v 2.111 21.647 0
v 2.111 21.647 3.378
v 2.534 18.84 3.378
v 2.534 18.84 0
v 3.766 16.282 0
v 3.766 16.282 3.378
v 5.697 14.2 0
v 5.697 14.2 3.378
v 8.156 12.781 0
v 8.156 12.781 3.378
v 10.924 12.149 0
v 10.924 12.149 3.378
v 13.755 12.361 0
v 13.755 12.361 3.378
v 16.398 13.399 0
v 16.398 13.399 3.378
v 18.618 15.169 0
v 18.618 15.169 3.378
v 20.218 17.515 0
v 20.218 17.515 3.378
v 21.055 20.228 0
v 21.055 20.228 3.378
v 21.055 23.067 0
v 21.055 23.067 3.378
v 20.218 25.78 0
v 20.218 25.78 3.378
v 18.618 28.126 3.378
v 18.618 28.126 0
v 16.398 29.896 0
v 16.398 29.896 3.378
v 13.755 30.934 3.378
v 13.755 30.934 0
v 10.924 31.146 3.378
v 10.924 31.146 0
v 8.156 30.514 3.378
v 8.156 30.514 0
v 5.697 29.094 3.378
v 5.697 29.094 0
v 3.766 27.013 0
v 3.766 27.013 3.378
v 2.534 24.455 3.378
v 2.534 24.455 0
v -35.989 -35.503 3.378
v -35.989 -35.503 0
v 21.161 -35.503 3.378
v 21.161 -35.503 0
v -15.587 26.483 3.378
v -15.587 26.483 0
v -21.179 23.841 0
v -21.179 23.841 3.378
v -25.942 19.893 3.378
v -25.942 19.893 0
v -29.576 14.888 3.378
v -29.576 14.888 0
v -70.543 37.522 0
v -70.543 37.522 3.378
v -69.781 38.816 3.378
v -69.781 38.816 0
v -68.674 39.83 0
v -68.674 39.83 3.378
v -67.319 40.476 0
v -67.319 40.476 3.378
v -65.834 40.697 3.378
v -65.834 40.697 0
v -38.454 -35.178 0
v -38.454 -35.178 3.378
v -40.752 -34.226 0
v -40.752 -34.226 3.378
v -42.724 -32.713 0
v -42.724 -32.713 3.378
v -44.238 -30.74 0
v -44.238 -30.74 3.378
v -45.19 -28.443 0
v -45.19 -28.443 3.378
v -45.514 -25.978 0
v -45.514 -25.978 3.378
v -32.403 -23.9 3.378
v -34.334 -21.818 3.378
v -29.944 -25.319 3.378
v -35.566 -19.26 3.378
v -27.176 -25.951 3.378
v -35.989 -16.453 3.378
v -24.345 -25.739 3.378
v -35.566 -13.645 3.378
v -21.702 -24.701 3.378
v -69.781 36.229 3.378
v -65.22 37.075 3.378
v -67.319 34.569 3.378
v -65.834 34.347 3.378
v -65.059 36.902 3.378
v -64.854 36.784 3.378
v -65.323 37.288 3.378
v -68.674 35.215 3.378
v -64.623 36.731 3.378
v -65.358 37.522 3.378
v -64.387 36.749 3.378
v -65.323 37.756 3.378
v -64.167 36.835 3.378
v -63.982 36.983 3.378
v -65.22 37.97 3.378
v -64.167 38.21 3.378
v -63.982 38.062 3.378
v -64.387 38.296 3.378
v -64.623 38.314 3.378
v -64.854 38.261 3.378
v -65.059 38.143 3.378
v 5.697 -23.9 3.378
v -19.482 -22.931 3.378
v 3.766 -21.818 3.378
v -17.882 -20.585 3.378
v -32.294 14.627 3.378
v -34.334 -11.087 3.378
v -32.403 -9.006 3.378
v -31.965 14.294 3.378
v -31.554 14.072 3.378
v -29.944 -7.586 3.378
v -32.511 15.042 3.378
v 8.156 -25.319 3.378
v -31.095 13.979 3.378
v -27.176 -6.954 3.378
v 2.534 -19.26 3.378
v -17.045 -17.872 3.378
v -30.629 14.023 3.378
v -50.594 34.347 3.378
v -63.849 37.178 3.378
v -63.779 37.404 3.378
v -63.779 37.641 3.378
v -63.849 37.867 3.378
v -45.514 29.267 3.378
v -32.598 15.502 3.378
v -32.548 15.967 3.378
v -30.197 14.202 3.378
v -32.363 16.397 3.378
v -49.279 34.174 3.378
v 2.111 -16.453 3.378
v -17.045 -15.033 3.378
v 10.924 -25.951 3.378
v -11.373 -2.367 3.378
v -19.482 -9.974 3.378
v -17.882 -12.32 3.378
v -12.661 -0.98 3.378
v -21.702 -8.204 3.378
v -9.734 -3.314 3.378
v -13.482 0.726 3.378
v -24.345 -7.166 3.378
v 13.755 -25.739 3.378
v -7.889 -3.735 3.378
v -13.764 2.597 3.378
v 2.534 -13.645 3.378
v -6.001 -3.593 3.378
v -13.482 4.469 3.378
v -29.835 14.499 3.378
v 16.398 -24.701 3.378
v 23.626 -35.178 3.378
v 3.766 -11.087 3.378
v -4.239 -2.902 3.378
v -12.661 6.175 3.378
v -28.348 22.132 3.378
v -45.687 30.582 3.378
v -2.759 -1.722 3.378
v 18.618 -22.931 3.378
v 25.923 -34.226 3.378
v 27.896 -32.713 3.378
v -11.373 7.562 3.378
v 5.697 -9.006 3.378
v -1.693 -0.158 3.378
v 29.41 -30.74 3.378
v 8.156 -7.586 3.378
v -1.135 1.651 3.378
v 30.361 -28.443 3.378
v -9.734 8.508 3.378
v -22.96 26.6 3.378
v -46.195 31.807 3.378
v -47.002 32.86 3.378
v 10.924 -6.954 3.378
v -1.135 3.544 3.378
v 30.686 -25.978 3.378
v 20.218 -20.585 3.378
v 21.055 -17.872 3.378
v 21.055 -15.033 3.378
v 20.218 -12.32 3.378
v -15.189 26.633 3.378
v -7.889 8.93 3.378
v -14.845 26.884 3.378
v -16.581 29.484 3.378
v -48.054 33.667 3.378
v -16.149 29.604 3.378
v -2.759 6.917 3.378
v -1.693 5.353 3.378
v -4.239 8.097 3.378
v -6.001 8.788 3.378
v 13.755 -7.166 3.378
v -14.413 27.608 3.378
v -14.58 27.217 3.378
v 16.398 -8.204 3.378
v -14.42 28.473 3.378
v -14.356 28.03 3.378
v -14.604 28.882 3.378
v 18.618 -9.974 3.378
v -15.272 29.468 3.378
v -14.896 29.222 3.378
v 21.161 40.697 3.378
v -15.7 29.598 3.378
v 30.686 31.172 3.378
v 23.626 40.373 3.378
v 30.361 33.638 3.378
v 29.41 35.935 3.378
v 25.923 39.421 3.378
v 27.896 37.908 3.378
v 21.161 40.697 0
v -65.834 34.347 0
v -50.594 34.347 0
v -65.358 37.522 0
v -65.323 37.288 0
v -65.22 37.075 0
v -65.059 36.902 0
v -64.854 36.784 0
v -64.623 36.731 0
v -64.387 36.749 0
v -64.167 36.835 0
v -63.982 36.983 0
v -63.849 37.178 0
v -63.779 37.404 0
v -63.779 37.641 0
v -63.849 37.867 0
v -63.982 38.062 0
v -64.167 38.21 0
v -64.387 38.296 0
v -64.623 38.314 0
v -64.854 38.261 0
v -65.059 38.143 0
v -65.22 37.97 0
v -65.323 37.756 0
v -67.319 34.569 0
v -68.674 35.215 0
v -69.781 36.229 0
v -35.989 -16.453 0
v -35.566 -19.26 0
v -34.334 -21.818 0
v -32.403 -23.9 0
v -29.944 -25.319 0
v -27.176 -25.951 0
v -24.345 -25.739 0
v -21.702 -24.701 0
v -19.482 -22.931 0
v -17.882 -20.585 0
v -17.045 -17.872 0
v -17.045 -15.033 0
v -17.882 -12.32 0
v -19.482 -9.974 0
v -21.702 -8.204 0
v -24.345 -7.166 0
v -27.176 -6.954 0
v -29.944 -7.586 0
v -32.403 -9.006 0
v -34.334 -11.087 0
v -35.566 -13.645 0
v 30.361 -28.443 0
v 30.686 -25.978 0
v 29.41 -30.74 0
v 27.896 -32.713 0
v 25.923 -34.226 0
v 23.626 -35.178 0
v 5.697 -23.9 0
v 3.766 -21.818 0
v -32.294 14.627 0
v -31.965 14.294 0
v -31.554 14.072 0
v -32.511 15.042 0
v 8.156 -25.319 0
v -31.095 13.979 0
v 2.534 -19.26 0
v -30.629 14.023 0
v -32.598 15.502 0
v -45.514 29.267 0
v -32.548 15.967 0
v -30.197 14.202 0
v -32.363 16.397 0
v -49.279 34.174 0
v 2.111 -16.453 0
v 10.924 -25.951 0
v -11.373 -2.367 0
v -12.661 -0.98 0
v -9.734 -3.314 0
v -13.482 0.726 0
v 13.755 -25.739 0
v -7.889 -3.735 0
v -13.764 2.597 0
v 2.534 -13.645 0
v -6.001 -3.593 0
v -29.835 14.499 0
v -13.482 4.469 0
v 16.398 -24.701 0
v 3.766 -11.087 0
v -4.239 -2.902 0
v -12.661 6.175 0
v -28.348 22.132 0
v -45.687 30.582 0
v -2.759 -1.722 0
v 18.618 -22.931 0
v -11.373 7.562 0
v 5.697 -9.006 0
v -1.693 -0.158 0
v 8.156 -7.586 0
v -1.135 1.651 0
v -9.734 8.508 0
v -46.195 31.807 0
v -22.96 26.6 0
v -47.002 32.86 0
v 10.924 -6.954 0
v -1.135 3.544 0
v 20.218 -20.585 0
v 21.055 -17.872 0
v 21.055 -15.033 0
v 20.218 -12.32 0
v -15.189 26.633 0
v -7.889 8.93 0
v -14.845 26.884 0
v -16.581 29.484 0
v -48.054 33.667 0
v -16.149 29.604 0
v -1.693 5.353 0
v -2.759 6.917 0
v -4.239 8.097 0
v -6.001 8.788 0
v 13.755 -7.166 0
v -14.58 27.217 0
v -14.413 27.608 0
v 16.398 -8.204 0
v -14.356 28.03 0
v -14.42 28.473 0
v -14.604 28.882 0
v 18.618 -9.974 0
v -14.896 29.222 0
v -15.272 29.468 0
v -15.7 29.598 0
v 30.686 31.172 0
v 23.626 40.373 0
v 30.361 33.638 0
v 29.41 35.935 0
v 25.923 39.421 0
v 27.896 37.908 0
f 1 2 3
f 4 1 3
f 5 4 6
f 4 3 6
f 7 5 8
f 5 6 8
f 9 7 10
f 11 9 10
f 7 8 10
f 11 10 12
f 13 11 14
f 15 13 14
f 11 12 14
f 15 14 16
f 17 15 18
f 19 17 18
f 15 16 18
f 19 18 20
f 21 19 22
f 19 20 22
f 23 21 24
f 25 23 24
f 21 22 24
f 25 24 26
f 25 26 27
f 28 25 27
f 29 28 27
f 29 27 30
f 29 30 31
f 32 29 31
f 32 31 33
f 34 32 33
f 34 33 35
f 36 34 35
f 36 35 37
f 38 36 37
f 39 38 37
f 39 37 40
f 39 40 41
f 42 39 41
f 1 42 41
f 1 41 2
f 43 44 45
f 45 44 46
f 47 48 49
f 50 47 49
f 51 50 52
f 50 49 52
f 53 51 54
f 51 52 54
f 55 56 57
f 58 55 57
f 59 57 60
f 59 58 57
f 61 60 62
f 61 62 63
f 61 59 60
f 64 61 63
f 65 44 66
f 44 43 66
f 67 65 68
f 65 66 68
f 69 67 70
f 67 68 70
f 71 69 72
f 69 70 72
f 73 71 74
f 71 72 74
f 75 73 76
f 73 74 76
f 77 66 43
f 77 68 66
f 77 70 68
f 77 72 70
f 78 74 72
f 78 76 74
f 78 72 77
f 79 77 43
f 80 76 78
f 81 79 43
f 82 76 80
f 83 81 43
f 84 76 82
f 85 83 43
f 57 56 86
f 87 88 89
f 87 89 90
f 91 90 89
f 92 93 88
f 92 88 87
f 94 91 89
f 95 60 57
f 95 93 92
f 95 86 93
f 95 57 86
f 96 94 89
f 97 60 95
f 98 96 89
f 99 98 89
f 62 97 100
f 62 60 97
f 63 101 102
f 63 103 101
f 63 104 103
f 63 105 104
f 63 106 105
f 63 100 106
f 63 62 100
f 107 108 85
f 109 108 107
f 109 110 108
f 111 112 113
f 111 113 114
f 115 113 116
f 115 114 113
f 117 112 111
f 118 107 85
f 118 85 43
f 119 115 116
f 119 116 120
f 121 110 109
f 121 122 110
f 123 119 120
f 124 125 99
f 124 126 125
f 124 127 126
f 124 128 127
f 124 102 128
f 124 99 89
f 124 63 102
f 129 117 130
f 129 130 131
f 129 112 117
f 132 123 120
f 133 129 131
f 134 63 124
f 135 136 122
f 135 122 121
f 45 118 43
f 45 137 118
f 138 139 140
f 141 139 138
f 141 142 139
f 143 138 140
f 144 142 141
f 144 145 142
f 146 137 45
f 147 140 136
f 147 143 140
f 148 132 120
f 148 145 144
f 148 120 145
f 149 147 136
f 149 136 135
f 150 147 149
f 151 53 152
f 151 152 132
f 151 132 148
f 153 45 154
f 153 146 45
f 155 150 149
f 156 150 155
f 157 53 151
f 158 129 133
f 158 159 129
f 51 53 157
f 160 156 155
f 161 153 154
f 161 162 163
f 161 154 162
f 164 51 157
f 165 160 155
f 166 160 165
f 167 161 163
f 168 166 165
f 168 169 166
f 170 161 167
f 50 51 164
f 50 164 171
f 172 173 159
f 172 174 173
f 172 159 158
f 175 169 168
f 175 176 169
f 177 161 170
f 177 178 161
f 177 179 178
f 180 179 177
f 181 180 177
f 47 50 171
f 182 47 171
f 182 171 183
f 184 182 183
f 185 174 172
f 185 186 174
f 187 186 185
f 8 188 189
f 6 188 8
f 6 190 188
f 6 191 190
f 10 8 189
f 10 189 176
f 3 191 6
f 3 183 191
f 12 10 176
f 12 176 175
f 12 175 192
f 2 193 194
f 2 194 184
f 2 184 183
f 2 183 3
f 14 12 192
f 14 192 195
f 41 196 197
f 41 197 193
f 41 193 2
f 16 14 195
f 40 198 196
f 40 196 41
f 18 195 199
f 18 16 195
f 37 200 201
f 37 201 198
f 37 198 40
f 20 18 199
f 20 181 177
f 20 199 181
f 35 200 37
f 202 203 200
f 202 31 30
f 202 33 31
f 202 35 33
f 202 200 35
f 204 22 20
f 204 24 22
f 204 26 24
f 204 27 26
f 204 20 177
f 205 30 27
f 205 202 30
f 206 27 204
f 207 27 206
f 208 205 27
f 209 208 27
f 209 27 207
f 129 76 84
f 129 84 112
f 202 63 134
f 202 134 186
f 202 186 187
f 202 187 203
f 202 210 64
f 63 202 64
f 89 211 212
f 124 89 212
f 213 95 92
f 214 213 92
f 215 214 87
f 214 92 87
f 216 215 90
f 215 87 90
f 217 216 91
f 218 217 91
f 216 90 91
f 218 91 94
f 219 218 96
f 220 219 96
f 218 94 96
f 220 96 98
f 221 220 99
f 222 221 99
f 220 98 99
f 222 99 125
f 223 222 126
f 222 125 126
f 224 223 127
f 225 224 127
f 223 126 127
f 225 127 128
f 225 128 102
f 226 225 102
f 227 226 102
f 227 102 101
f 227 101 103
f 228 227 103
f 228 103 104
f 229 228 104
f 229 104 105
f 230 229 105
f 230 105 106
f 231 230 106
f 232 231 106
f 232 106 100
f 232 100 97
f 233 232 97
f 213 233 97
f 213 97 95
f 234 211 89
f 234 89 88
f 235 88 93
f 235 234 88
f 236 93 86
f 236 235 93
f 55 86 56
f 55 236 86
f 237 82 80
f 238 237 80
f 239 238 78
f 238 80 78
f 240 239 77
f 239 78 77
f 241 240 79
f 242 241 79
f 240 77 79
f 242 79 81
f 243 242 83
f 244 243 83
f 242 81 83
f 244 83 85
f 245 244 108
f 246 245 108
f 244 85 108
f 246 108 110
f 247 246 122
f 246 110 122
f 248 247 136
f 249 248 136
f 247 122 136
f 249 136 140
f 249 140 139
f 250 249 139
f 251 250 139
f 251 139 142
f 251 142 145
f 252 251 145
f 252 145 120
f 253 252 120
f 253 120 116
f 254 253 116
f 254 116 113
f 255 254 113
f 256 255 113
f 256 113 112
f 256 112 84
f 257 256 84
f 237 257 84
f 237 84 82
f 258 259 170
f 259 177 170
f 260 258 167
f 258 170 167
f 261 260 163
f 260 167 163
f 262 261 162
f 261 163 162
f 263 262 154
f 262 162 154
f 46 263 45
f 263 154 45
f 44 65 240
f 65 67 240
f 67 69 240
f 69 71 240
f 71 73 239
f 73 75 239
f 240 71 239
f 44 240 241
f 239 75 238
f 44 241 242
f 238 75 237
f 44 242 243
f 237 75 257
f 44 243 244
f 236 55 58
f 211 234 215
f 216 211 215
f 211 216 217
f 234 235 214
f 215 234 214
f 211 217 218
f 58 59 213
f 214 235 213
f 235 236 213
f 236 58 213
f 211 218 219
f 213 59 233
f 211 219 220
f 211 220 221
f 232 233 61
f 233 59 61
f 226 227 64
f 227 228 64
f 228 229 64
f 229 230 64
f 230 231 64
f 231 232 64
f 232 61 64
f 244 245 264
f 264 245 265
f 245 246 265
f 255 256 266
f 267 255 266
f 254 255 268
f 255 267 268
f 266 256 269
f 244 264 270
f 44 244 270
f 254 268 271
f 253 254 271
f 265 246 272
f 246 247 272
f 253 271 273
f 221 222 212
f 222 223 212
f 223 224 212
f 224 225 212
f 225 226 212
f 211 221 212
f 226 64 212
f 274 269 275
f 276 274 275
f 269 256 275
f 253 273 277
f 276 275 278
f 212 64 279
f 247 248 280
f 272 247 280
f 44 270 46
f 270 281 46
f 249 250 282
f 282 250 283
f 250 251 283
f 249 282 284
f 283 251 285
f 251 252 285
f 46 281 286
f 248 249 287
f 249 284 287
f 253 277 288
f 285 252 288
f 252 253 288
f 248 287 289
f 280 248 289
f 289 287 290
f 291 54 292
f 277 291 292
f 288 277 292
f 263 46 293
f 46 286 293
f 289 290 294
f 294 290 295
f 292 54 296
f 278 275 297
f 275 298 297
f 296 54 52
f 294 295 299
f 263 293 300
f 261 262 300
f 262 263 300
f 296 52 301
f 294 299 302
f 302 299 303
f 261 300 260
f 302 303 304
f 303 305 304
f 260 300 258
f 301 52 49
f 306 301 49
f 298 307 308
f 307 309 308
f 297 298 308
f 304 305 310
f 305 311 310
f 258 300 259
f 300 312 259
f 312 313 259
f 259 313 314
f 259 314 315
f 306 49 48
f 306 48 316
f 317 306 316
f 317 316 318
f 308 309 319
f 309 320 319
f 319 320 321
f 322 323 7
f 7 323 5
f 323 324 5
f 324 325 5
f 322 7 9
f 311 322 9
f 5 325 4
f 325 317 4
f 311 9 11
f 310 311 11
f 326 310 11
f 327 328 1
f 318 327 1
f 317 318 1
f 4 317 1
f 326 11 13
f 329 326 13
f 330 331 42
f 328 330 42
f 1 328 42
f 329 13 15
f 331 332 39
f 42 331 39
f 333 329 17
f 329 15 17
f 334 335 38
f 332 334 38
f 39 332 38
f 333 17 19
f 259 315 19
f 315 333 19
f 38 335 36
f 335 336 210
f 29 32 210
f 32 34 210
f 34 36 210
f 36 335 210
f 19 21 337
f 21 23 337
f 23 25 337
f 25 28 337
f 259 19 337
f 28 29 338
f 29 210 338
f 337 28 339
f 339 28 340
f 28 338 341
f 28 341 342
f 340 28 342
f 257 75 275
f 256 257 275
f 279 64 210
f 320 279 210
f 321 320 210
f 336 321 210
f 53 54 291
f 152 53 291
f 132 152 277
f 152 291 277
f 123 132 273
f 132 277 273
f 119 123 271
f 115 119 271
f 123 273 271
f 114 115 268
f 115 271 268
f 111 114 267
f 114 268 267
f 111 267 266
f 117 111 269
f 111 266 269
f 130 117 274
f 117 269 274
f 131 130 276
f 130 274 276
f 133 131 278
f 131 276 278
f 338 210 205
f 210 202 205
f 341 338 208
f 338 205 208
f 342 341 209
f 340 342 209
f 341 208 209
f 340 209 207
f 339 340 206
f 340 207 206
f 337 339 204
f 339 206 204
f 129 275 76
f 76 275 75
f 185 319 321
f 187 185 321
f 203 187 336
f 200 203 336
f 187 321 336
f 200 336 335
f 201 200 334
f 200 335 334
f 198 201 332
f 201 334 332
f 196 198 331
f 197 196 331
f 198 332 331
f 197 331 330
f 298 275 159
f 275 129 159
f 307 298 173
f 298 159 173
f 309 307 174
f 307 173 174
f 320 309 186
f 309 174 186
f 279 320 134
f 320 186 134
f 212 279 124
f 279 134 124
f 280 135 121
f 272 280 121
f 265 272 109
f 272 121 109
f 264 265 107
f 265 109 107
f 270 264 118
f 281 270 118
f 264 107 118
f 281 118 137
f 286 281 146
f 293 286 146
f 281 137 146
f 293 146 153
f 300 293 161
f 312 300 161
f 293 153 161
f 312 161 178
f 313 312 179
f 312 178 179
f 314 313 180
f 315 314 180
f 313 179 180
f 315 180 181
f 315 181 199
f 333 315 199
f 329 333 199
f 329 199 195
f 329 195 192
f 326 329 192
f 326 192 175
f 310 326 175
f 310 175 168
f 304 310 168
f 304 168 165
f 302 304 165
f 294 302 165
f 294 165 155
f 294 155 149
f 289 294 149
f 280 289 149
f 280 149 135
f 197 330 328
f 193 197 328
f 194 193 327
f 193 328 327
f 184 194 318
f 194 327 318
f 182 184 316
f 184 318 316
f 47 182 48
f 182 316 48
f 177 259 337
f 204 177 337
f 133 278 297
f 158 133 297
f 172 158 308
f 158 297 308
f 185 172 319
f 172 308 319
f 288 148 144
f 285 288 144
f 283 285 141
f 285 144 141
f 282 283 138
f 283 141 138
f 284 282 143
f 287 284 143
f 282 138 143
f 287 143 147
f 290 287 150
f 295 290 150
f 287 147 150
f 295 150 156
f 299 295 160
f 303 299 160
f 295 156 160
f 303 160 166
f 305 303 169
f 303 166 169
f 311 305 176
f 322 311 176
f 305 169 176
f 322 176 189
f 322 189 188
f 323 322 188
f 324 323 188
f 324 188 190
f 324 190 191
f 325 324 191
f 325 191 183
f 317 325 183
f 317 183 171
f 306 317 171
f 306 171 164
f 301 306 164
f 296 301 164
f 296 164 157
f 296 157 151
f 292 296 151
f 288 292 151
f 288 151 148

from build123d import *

# Parameters (mm, degrees)
F0_W        = 25.4
F0_H        = 6.35
F1_DEPTH    = 3.3782
F2_D        = 12.7
F3_D        = 19.05
F4_D        = 1.5875
F5_R        = 9.525
F6_T1_DEPTH = 28.7782
F7_R        = 5.08


# Not quite as in the source:
# - a fillet or chamfer that OpenCascade refuses, or shapes differently, is made with other operations: its cross-section is extruded or revolved along the edge and cut away or added
# - a feature names something its author has since deleted; it is built from what else it names


with BuildPart() as f1:
    # F0 (on Top) → F1 (new body)
    with BuildSketch(Plane.XY):
        Polygon((30.6859308559, 40.6974393192), (-45.5140691441, 40.6974393192), (-45.5140691441, 34.3474393192), (-45.5140691441, -35.5025606808), (30.6859308559, -35.5025606808), align=None)
        with BuildLine():
            ThreePointArc((-16.5807714399, 29.4836296191), (-15.0751376879, 29.3583825497), (-14.3562023103, 28.0295666307))
            ThreePointArc((-14.3562023103, 28.0295666307), (-14.7013947794, 27.0412204117), (-15.5868520724, 26.4826942515))
            ThreePointArc((-15.5868520724, 26.4826942515), (-23.6844276087, 22.0164519839), (-29.5755584989, 14.8881544036))
            ThreePointArc((-29.5755584989, 14.8881544036), (-31.7676732764, 14.1678257415), (-32.3633731557, 16.397036865))
            ThreePointArc((-32.3633731557, 16.397036865), (-25.8037717935, 24.5463802201), (-16.5807714399, 29.4836296191))
        make_face(mode=Mode.SUBTRACT)
        with Locations((-58.2140691441, 37.5224393192)):
            Rectangle(F0_W, F0_H)
    extrude(amount=F1_DEPTH)

    # F2 (through all)
    with Locations(Plane(origin=(0, 0, 0), x_dir=(1, 0, 0), z_dir=(0, 0, -1))):
        with Locations((-7.4140691441, -2.5974393192)):
            Hole(F2_D / 2)

    # F3 (through all)
    with Locations(Plane(origin=(0, 0, 0), x_dir=(1, 0, 0), z_dir=(0, 0, -1))):
        with Locations((11.6359308559, -21.6474393192), (11.6359308559, 16.4525606808), (-26.4640691441, 16.4525606808)):
            Hole(F3_D / 2)

    # F4 (through all)
    with Locations(Plane(origin=(0, 0, 0), x_dir=(1, 0, 0), z_dir=(0, 0, -1))):
        with Locations((-64.5640691441, -37.5224393192)):
            Hole(F4_D / 2)

    # F5
    f5_edges = [f1.edges().sort_by_distance(p)[0] for p in [
        (30.685931, -35.502561, 1.6891),
        (-45.514069, -35.502561, 1.6891),
        (30.685931, 40.697439, 1.6891),
    ]]
    fillet(f5_edges, radius=F5_R)

    # F6: fillet of radius 5.08 on 2 edges, made by hand

    # F6_s2 → F6_t1 (cut)
    with BuildSketch(Plane.XY.offset(-12.7)):
        with BuildLine():
            ThreePointArc((-70.9140691441, 35.6174393192), (-69.4261715925, 39.2095417676), (-65.8340691441, 40.6974393192))
            Line((-65.8340691441, 40.6974393192), (-70.9140691441, 40.6974393192))
            Line((-70.9140691441, 40.6974393192), (-70.9140691441, 35.6174393192))
        make_face()
        with BuildLine():
            ThreePointArc((-65.8340691441, 34.3474393192), (-69.4261715925, 35.8353368707), (-70.9140691441, 39.4274393192))
            Line((-70.9140691441, 39.4274393192), (-70.9140691441, 34.3474393192))
            Line((-70.9140691441, 34.3474393192), (-65.8340691441, 34.3474393192))
        make_face()
    extrude(amount=F6_T1_DEPTH, mode=Mode.SUBTRACT)

    # F7
    f7_edges = [f1.edges().sort_by_distance(p)[0] for p in [
        (-45.514069, 34.347439, 1.6891),
    ]]
    fillet(f7_edges, radius=F7_R)


solid = f1.part
